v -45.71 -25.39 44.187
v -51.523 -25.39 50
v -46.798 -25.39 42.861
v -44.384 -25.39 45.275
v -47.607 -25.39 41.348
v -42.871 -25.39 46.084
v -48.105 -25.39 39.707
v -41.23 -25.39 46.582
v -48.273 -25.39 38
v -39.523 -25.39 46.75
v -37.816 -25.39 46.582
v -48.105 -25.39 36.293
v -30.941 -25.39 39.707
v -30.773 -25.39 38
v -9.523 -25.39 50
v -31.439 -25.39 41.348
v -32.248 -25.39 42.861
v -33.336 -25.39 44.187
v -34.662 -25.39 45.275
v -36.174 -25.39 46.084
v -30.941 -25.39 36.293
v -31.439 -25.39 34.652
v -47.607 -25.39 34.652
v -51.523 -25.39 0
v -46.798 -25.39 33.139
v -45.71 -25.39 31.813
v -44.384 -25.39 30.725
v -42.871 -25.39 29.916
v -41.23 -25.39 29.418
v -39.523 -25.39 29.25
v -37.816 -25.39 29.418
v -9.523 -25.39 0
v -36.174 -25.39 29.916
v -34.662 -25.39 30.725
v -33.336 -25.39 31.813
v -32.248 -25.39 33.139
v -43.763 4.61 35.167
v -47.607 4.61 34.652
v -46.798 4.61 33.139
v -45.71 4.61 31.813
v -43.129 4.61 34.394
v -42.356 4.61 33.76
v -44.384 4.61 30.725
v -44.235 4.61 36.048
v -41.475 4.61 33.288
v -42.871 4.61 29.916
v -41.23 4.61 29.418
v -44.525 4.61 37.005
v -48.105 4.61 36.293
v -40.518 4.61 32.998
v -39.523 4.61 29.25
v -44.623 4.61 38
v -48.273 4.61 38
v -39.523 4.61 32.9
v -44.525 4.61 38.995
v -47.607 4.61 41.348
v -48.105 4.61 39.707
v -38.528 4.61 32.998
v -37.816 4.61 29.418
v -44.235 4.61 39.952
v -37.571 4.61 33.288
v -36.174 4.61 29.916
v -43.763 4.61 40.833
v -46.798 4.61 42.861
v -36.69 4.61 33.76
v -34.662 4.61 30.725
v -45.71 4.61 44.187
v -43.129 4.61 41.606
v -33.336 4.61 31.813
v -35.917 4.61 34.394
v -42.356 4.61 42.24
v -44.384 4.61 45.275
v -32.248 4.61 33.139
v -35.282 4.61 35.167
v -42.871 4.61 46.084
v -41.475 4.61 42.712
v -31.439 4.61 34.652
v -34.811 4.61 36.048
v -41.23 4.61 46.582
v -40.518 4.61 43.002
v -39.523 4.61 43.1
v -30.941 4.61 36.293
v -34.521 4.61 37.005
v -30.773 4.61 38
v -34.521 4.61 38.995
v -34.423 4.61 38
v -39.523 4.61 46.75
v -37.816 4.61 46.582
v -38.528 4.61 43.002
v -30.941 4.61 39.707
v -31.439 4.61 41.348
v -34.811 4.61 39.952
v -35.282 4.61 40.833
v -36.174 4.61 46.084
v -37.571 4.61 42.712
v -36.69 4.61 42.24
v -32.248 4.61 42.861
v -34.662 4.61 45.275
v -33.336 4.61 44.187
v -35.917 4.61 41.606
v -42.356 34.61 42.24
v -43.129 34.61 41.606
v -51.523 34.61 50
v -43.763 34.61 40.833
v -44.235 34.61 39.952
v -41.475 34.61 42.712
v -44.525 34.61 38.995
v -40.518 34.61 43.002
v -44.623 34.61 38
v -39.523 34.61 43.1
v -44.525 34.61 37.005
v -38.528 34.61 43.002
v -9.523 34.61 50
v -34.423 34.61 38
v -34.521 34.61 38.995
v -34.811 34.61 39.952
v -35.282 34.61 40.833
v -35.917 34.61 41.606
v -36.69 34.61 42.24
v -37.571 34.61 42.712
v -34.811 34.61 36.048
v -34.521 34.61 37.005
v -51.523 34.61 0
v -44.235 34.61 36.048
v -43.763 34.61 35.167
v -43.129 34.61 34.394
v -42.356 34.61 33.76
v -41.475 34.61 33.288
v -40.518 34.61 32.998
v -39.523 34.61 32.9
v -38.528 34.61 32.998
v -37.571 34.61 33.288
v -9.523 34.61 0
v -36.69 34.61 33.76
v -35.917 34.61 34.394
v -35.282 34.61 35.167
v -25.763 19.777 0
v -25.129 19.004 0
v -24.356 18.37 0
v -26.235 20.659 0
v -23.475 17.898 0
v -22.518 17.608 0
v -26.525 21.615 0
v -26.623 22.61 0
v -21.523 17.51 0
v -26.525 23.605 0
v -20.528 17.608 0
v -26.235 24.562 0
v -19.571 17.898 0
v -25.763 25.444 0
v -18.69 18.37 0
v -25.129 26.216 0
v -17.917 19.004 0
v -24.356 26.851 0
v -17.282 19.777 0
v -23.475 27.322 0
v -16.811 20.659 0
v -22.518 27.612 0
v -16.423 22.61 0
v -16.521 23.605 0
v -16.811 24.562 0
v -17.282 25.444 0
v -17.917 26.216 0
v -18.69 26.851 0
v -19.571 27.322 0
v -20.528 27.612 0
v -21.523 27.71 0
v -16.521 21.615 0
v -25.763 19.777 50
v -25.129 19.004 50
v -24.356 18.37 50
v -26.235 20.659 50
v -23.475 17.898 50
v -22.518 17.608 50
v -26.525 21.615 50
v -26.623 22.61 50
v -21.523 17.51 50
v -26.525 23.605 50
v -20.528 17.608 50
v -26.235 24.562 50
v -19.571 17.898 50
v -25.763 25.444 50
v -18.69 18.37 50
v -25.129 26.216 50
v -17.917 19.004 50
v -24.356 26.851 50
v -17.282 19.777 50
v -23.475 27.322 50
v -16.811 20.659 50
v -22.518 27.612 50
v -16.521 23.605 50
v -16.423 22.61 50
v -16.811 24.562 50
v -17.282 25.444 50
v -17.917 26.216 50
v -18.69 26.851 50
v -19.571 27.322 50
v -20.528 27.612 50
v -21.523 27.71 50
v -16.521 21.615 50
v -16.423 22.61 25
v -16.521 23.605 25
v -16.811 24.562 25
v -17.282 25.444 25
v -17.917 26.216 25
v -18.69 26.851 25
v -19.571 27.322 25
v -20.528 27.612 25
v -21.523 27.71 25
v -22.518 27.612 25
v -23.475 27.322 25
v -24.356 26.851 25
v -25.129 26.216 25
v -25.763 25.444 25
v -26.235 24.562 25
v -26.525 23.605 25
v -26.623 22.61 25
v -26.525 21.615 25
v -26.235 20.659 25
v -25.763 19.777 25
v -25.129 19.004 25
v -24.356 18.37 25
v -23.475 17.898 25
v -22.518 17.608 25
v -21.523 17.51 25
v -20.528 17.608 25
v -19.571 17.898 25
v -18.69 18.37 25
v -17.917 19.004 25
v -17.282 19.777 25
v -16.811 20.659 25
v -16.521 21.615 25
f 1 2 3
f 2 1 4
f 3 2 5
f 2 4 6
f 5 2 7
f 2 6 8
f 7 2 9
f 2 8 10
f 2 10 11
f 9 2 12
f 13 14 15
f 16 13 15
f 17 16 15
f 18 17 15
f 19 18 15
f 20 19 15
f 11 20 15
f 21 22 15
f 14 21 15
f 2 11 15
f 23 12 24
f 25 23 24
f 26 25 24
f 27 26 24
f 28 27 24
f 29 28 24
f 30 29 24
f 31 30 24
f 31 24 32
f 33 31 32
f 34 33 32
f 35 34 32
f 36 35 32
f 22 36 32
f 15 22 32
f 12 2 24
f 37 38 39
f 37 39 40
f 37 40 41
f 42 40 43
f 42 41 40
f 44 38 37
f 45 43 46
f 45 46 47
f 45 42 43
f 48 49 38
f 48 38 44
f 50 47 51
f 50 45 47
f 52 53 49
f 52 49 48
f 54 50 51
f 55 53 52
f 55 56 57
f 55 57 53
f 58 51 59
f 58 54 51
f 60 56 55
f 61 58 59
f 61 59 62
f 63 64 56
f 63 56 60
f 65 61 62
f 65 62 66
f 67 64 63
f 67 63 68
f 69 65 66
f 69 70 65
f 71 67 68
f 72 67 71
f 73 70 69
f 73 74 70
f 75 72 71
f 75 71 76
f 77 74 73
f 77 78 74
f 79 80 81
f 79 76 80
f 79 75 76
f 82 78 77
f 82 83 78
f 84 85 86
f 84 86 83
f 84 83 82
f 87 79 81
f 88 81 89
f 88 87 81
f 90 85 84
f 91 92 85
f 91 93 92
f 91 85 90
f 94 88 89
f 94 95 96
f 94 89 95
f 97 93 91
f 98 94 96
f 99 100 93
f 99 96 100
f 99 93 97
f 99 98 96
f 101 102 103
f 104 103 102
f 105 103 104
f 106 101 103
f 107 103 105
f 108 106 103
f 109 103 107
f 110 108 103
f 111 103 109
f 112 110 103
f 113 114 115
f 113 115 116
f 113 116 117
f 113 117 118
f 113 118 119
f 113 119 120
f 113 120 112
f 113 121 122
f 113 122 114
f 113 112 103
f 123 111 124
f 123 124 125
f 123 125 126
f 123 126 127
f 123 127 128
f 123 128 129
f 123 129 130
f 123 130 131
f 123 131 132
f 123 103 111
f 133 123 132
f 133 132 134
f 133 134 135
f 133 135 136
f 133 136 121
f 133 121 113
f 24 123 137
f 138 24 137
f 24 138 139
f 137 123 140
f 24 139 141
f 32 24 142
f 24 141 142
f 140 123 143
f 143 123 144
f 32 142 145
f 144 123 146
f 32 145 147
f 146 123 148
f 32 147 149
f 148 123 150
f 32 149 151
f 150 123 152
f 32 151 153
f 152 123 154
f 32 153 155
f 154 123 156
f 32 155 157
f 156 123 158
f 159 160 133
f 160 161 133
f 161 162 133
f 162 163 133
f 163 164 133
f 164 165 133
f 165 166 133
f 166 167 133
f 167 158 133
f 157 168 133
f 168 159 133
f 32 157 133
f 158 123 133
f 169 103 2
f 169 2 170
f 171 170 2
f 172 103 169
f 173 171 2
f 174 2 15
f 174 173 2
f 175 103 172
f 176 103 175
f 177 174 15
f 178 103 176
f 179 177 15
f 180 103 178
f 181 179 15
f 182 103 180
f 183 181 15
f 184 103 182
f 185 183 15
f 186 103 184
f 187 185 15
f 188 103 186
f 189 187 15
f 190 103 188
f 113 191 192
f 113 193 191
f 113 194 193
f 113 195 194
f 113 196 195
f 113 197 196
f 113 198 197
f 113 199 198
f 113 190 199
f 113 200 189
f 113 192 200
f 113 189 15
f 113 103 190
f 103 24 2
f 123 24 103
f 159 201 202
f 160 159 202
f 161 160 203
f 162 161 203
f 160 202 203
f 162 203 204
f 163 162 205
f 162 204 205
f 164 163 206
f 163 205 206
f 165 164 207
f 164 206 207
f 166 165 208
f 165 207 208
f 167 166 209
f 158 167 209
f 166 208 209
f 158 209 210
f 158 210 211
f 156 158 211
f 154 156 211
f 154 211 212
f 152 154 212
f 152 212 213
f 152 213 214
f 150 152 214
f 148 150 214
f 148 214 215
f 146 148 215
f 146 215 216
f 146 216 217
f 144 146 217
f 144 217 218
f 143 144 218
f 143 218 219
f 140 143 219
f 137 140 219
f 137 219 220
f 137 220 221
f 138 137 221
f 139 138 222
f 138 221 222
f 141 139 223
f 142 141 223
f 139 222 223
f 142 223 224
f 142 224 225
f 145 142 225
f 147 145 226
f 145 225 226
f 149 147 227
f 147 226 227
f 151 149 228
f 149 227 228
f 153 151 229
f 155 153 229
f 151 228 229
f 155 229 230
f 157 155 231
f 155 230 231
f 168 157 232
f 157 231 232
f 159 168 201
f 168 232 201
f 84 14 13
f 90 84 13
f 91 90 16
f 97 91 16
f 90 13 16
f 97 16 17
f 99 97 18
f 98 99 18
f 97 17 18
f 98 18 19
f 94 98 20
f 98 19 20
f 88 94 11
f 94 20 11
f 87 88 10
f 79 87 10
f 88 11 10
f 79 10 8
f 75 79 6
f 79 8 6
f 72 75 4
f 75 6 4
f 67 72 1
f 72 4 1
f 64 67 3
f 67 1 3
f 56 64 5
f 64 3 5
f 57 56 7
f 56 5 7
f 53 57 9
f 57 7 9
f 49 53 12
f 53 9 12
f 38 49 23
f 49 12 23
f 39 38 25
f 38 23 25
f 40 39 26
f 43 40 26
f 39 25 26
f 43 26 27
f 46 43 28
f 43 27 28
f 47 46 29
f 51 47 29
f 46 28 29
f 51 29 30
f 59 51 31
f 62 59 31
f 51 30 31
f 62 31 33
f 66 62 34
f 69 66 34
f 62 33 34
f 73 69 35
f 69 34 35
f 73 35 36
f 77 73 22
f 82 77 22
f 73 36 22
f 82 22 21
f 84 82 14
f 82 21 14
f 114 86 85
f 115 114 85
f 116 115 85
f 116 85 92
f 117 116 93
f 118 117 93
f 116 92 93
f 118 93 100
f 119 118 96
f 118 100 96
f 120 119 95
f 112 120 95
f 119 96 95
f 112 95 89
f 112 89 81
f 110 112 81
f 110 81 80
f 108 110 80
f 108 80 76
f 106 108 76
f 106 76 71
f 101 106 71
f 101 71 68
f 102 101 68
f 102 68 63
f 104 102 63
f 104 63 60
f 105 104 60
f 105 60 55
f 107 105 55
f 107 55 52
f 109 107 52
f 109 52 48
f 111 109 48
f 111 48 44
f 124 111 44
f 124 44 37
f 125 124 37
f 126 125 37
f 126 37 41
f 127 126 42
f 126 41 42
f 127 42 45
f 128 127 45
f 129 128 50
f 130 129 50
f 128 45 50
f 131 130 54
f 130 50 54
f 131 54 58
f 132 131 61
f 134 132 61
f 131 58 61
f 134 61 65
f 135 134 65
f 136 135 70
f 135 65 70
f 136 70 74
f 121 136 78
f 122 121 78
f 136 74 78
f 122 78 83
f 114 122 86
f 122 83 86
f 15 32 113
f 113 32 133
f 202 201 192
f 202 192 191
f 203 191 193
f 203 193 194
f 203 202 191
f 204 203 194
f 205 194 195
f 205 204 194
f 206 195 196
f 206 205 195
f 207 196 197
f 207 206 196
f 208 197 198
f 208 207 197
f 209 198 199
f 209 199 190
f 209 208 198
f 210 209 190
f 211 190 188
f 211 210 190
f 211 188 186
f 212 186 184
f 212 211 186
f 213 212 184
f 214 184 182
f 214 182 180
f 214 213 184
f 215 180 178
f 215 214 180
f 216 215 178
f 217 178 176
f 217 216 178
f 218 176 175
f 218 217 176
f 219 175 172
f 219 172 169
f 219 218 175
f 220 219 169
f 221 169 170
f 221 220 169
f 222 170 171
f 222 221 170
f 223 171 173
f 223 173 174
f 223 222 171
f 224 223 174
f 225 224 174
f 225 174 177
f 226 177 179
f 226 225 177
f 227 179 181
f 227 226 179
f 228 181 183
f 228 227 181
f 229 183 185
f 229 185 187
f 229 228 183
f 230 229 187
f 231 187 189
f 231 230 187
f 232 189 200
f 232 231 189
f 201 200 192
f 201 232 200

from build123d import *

# Parameters (mm, degrees)
F0_W      = 42
F0_H      = 60
F1_DEPTH  = 25
F2_R      = 5.1
F3_DEPTH  = 25.001
F1_FACE_W = 42
F1_FACE_H = 60
F1_FACE_R = 5.1
F4_DEPTH  = 25
F5_R      = 8.75
F6_DEPTH  = 30
F7_R      = 5.1
F8_DEPTH  = 60


with BuildPart() as f1:
    # F0 (on Top) → F1 (new body)
    with BuildSketch(Plane.XY):
        with Locations((-30.522955, 4.610215)):
            Rectangle(F0_W, F0_H)
    extrude(amount=F1_DEPTH)

    # F2 (on face) → F3 (cut, through all)
    with BuildSketch(Plane.XY.offset(25)):
        with Locations((-21.522955, 22.610215)):
            Circle(F2_R)
    extrude(amount=-F3_DEPTH, mode=Mode.SUBTRACT)

    # F1_face (on face) → F4 (join)
    with BuildSketch(Plane(origin=(-30.522955, 4.610215, 25), x_dir=(1, 0, 0), z_dir=(0, 0, 1))):
        Rectangle(F1_FACE_W, F1_FACE_H)
        with Locations((9, 18)):
            Circle(F1_FACE_R, mode=Mode.SUBTRACT)
    extrude(amount=F4_DEPTH)

    # F5 (on face) → F6 (cut)
    with BuildSketch(Plane.XZ.offset(25.389785)):
        with Locations((-39.522955, 38)):
            Circle(F5_R)
    extrude(amount=-F6_DEPTH, mode=Mode.SUBTRACT)

    # F7 (on face) → F8 (cut)
    with BuildSketch(Plane.XZ.offset(-4.610215)):
        with Locations((-39.522955, 38)):
            Circle(F7_R)
    extrude(amount=-F8_DEPTH, mode=Mode.SUBTRACT)


solid = f1.part
